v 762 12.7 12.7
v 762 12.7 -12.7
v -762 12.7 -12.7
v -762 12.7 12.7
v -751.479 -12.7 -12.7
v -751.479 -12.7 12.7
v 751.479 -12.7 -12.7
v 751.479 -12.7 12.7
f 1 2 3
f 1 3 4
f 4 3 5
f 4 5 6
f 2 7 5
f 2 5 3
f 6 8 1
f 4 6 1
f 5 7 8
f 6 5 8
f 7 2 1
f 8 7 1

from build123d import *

# Parameters (mm, degrees)
F0_W       = 25.4
F0_H       = 25.4
F1_DEPTH   = 762
F2_SIZE2   = 10.521014
F2_SIZE    = 25.39999
F2_2_SIZE2 = 10.521014
F2_2_SIZE  = 25.39999


# Not quite as in the source:
# - a fillet or chamfer is up to 0.001 mm smaller than in the source, because OpenCascade refuses the exact size


with BuildPart() as f1:
    # F0 (on Right) → F1 (new body, symmetric)
    with BuildSketch(Plane.YZ):
        Rectangle(F0_W, F0_H)
    extrude(amount=F1_DEPTH, both=True)

    # F2 (size 25.4 and 10.5210244843 in the source; OpenCascade refuses exactly that, so slightly less here)
    f2_edges = [f1.edges().sort_by_distance(p)[0] for p in [
        (762, -12.7, 0),
    ]]
    f2_side = f1.faces().sort_by_distance((762, 0, 0))[0]
    chamfer(f2_edges, length=F2_SIZE, length2=F2_SIZE2, reference=f2_side)

    # F2#2 (size 25.4 and 10.5210244843 in the source; OpenCascade refuses exactly that, so slightly less here)
    f2_2_edges = [f1.edges().sort_by_distance(p)[0] for p in [
        (-762, -12.7, 0),
    ]]
    f2_2_side = f1.faces().sort_by_distance((-762, 0, 0))[0]
    chamfer(f2_2_edges, length=F2_2_SIZE, length2=F2_2_SIZE2, reference=f2_2_side)


solid = f1.part
